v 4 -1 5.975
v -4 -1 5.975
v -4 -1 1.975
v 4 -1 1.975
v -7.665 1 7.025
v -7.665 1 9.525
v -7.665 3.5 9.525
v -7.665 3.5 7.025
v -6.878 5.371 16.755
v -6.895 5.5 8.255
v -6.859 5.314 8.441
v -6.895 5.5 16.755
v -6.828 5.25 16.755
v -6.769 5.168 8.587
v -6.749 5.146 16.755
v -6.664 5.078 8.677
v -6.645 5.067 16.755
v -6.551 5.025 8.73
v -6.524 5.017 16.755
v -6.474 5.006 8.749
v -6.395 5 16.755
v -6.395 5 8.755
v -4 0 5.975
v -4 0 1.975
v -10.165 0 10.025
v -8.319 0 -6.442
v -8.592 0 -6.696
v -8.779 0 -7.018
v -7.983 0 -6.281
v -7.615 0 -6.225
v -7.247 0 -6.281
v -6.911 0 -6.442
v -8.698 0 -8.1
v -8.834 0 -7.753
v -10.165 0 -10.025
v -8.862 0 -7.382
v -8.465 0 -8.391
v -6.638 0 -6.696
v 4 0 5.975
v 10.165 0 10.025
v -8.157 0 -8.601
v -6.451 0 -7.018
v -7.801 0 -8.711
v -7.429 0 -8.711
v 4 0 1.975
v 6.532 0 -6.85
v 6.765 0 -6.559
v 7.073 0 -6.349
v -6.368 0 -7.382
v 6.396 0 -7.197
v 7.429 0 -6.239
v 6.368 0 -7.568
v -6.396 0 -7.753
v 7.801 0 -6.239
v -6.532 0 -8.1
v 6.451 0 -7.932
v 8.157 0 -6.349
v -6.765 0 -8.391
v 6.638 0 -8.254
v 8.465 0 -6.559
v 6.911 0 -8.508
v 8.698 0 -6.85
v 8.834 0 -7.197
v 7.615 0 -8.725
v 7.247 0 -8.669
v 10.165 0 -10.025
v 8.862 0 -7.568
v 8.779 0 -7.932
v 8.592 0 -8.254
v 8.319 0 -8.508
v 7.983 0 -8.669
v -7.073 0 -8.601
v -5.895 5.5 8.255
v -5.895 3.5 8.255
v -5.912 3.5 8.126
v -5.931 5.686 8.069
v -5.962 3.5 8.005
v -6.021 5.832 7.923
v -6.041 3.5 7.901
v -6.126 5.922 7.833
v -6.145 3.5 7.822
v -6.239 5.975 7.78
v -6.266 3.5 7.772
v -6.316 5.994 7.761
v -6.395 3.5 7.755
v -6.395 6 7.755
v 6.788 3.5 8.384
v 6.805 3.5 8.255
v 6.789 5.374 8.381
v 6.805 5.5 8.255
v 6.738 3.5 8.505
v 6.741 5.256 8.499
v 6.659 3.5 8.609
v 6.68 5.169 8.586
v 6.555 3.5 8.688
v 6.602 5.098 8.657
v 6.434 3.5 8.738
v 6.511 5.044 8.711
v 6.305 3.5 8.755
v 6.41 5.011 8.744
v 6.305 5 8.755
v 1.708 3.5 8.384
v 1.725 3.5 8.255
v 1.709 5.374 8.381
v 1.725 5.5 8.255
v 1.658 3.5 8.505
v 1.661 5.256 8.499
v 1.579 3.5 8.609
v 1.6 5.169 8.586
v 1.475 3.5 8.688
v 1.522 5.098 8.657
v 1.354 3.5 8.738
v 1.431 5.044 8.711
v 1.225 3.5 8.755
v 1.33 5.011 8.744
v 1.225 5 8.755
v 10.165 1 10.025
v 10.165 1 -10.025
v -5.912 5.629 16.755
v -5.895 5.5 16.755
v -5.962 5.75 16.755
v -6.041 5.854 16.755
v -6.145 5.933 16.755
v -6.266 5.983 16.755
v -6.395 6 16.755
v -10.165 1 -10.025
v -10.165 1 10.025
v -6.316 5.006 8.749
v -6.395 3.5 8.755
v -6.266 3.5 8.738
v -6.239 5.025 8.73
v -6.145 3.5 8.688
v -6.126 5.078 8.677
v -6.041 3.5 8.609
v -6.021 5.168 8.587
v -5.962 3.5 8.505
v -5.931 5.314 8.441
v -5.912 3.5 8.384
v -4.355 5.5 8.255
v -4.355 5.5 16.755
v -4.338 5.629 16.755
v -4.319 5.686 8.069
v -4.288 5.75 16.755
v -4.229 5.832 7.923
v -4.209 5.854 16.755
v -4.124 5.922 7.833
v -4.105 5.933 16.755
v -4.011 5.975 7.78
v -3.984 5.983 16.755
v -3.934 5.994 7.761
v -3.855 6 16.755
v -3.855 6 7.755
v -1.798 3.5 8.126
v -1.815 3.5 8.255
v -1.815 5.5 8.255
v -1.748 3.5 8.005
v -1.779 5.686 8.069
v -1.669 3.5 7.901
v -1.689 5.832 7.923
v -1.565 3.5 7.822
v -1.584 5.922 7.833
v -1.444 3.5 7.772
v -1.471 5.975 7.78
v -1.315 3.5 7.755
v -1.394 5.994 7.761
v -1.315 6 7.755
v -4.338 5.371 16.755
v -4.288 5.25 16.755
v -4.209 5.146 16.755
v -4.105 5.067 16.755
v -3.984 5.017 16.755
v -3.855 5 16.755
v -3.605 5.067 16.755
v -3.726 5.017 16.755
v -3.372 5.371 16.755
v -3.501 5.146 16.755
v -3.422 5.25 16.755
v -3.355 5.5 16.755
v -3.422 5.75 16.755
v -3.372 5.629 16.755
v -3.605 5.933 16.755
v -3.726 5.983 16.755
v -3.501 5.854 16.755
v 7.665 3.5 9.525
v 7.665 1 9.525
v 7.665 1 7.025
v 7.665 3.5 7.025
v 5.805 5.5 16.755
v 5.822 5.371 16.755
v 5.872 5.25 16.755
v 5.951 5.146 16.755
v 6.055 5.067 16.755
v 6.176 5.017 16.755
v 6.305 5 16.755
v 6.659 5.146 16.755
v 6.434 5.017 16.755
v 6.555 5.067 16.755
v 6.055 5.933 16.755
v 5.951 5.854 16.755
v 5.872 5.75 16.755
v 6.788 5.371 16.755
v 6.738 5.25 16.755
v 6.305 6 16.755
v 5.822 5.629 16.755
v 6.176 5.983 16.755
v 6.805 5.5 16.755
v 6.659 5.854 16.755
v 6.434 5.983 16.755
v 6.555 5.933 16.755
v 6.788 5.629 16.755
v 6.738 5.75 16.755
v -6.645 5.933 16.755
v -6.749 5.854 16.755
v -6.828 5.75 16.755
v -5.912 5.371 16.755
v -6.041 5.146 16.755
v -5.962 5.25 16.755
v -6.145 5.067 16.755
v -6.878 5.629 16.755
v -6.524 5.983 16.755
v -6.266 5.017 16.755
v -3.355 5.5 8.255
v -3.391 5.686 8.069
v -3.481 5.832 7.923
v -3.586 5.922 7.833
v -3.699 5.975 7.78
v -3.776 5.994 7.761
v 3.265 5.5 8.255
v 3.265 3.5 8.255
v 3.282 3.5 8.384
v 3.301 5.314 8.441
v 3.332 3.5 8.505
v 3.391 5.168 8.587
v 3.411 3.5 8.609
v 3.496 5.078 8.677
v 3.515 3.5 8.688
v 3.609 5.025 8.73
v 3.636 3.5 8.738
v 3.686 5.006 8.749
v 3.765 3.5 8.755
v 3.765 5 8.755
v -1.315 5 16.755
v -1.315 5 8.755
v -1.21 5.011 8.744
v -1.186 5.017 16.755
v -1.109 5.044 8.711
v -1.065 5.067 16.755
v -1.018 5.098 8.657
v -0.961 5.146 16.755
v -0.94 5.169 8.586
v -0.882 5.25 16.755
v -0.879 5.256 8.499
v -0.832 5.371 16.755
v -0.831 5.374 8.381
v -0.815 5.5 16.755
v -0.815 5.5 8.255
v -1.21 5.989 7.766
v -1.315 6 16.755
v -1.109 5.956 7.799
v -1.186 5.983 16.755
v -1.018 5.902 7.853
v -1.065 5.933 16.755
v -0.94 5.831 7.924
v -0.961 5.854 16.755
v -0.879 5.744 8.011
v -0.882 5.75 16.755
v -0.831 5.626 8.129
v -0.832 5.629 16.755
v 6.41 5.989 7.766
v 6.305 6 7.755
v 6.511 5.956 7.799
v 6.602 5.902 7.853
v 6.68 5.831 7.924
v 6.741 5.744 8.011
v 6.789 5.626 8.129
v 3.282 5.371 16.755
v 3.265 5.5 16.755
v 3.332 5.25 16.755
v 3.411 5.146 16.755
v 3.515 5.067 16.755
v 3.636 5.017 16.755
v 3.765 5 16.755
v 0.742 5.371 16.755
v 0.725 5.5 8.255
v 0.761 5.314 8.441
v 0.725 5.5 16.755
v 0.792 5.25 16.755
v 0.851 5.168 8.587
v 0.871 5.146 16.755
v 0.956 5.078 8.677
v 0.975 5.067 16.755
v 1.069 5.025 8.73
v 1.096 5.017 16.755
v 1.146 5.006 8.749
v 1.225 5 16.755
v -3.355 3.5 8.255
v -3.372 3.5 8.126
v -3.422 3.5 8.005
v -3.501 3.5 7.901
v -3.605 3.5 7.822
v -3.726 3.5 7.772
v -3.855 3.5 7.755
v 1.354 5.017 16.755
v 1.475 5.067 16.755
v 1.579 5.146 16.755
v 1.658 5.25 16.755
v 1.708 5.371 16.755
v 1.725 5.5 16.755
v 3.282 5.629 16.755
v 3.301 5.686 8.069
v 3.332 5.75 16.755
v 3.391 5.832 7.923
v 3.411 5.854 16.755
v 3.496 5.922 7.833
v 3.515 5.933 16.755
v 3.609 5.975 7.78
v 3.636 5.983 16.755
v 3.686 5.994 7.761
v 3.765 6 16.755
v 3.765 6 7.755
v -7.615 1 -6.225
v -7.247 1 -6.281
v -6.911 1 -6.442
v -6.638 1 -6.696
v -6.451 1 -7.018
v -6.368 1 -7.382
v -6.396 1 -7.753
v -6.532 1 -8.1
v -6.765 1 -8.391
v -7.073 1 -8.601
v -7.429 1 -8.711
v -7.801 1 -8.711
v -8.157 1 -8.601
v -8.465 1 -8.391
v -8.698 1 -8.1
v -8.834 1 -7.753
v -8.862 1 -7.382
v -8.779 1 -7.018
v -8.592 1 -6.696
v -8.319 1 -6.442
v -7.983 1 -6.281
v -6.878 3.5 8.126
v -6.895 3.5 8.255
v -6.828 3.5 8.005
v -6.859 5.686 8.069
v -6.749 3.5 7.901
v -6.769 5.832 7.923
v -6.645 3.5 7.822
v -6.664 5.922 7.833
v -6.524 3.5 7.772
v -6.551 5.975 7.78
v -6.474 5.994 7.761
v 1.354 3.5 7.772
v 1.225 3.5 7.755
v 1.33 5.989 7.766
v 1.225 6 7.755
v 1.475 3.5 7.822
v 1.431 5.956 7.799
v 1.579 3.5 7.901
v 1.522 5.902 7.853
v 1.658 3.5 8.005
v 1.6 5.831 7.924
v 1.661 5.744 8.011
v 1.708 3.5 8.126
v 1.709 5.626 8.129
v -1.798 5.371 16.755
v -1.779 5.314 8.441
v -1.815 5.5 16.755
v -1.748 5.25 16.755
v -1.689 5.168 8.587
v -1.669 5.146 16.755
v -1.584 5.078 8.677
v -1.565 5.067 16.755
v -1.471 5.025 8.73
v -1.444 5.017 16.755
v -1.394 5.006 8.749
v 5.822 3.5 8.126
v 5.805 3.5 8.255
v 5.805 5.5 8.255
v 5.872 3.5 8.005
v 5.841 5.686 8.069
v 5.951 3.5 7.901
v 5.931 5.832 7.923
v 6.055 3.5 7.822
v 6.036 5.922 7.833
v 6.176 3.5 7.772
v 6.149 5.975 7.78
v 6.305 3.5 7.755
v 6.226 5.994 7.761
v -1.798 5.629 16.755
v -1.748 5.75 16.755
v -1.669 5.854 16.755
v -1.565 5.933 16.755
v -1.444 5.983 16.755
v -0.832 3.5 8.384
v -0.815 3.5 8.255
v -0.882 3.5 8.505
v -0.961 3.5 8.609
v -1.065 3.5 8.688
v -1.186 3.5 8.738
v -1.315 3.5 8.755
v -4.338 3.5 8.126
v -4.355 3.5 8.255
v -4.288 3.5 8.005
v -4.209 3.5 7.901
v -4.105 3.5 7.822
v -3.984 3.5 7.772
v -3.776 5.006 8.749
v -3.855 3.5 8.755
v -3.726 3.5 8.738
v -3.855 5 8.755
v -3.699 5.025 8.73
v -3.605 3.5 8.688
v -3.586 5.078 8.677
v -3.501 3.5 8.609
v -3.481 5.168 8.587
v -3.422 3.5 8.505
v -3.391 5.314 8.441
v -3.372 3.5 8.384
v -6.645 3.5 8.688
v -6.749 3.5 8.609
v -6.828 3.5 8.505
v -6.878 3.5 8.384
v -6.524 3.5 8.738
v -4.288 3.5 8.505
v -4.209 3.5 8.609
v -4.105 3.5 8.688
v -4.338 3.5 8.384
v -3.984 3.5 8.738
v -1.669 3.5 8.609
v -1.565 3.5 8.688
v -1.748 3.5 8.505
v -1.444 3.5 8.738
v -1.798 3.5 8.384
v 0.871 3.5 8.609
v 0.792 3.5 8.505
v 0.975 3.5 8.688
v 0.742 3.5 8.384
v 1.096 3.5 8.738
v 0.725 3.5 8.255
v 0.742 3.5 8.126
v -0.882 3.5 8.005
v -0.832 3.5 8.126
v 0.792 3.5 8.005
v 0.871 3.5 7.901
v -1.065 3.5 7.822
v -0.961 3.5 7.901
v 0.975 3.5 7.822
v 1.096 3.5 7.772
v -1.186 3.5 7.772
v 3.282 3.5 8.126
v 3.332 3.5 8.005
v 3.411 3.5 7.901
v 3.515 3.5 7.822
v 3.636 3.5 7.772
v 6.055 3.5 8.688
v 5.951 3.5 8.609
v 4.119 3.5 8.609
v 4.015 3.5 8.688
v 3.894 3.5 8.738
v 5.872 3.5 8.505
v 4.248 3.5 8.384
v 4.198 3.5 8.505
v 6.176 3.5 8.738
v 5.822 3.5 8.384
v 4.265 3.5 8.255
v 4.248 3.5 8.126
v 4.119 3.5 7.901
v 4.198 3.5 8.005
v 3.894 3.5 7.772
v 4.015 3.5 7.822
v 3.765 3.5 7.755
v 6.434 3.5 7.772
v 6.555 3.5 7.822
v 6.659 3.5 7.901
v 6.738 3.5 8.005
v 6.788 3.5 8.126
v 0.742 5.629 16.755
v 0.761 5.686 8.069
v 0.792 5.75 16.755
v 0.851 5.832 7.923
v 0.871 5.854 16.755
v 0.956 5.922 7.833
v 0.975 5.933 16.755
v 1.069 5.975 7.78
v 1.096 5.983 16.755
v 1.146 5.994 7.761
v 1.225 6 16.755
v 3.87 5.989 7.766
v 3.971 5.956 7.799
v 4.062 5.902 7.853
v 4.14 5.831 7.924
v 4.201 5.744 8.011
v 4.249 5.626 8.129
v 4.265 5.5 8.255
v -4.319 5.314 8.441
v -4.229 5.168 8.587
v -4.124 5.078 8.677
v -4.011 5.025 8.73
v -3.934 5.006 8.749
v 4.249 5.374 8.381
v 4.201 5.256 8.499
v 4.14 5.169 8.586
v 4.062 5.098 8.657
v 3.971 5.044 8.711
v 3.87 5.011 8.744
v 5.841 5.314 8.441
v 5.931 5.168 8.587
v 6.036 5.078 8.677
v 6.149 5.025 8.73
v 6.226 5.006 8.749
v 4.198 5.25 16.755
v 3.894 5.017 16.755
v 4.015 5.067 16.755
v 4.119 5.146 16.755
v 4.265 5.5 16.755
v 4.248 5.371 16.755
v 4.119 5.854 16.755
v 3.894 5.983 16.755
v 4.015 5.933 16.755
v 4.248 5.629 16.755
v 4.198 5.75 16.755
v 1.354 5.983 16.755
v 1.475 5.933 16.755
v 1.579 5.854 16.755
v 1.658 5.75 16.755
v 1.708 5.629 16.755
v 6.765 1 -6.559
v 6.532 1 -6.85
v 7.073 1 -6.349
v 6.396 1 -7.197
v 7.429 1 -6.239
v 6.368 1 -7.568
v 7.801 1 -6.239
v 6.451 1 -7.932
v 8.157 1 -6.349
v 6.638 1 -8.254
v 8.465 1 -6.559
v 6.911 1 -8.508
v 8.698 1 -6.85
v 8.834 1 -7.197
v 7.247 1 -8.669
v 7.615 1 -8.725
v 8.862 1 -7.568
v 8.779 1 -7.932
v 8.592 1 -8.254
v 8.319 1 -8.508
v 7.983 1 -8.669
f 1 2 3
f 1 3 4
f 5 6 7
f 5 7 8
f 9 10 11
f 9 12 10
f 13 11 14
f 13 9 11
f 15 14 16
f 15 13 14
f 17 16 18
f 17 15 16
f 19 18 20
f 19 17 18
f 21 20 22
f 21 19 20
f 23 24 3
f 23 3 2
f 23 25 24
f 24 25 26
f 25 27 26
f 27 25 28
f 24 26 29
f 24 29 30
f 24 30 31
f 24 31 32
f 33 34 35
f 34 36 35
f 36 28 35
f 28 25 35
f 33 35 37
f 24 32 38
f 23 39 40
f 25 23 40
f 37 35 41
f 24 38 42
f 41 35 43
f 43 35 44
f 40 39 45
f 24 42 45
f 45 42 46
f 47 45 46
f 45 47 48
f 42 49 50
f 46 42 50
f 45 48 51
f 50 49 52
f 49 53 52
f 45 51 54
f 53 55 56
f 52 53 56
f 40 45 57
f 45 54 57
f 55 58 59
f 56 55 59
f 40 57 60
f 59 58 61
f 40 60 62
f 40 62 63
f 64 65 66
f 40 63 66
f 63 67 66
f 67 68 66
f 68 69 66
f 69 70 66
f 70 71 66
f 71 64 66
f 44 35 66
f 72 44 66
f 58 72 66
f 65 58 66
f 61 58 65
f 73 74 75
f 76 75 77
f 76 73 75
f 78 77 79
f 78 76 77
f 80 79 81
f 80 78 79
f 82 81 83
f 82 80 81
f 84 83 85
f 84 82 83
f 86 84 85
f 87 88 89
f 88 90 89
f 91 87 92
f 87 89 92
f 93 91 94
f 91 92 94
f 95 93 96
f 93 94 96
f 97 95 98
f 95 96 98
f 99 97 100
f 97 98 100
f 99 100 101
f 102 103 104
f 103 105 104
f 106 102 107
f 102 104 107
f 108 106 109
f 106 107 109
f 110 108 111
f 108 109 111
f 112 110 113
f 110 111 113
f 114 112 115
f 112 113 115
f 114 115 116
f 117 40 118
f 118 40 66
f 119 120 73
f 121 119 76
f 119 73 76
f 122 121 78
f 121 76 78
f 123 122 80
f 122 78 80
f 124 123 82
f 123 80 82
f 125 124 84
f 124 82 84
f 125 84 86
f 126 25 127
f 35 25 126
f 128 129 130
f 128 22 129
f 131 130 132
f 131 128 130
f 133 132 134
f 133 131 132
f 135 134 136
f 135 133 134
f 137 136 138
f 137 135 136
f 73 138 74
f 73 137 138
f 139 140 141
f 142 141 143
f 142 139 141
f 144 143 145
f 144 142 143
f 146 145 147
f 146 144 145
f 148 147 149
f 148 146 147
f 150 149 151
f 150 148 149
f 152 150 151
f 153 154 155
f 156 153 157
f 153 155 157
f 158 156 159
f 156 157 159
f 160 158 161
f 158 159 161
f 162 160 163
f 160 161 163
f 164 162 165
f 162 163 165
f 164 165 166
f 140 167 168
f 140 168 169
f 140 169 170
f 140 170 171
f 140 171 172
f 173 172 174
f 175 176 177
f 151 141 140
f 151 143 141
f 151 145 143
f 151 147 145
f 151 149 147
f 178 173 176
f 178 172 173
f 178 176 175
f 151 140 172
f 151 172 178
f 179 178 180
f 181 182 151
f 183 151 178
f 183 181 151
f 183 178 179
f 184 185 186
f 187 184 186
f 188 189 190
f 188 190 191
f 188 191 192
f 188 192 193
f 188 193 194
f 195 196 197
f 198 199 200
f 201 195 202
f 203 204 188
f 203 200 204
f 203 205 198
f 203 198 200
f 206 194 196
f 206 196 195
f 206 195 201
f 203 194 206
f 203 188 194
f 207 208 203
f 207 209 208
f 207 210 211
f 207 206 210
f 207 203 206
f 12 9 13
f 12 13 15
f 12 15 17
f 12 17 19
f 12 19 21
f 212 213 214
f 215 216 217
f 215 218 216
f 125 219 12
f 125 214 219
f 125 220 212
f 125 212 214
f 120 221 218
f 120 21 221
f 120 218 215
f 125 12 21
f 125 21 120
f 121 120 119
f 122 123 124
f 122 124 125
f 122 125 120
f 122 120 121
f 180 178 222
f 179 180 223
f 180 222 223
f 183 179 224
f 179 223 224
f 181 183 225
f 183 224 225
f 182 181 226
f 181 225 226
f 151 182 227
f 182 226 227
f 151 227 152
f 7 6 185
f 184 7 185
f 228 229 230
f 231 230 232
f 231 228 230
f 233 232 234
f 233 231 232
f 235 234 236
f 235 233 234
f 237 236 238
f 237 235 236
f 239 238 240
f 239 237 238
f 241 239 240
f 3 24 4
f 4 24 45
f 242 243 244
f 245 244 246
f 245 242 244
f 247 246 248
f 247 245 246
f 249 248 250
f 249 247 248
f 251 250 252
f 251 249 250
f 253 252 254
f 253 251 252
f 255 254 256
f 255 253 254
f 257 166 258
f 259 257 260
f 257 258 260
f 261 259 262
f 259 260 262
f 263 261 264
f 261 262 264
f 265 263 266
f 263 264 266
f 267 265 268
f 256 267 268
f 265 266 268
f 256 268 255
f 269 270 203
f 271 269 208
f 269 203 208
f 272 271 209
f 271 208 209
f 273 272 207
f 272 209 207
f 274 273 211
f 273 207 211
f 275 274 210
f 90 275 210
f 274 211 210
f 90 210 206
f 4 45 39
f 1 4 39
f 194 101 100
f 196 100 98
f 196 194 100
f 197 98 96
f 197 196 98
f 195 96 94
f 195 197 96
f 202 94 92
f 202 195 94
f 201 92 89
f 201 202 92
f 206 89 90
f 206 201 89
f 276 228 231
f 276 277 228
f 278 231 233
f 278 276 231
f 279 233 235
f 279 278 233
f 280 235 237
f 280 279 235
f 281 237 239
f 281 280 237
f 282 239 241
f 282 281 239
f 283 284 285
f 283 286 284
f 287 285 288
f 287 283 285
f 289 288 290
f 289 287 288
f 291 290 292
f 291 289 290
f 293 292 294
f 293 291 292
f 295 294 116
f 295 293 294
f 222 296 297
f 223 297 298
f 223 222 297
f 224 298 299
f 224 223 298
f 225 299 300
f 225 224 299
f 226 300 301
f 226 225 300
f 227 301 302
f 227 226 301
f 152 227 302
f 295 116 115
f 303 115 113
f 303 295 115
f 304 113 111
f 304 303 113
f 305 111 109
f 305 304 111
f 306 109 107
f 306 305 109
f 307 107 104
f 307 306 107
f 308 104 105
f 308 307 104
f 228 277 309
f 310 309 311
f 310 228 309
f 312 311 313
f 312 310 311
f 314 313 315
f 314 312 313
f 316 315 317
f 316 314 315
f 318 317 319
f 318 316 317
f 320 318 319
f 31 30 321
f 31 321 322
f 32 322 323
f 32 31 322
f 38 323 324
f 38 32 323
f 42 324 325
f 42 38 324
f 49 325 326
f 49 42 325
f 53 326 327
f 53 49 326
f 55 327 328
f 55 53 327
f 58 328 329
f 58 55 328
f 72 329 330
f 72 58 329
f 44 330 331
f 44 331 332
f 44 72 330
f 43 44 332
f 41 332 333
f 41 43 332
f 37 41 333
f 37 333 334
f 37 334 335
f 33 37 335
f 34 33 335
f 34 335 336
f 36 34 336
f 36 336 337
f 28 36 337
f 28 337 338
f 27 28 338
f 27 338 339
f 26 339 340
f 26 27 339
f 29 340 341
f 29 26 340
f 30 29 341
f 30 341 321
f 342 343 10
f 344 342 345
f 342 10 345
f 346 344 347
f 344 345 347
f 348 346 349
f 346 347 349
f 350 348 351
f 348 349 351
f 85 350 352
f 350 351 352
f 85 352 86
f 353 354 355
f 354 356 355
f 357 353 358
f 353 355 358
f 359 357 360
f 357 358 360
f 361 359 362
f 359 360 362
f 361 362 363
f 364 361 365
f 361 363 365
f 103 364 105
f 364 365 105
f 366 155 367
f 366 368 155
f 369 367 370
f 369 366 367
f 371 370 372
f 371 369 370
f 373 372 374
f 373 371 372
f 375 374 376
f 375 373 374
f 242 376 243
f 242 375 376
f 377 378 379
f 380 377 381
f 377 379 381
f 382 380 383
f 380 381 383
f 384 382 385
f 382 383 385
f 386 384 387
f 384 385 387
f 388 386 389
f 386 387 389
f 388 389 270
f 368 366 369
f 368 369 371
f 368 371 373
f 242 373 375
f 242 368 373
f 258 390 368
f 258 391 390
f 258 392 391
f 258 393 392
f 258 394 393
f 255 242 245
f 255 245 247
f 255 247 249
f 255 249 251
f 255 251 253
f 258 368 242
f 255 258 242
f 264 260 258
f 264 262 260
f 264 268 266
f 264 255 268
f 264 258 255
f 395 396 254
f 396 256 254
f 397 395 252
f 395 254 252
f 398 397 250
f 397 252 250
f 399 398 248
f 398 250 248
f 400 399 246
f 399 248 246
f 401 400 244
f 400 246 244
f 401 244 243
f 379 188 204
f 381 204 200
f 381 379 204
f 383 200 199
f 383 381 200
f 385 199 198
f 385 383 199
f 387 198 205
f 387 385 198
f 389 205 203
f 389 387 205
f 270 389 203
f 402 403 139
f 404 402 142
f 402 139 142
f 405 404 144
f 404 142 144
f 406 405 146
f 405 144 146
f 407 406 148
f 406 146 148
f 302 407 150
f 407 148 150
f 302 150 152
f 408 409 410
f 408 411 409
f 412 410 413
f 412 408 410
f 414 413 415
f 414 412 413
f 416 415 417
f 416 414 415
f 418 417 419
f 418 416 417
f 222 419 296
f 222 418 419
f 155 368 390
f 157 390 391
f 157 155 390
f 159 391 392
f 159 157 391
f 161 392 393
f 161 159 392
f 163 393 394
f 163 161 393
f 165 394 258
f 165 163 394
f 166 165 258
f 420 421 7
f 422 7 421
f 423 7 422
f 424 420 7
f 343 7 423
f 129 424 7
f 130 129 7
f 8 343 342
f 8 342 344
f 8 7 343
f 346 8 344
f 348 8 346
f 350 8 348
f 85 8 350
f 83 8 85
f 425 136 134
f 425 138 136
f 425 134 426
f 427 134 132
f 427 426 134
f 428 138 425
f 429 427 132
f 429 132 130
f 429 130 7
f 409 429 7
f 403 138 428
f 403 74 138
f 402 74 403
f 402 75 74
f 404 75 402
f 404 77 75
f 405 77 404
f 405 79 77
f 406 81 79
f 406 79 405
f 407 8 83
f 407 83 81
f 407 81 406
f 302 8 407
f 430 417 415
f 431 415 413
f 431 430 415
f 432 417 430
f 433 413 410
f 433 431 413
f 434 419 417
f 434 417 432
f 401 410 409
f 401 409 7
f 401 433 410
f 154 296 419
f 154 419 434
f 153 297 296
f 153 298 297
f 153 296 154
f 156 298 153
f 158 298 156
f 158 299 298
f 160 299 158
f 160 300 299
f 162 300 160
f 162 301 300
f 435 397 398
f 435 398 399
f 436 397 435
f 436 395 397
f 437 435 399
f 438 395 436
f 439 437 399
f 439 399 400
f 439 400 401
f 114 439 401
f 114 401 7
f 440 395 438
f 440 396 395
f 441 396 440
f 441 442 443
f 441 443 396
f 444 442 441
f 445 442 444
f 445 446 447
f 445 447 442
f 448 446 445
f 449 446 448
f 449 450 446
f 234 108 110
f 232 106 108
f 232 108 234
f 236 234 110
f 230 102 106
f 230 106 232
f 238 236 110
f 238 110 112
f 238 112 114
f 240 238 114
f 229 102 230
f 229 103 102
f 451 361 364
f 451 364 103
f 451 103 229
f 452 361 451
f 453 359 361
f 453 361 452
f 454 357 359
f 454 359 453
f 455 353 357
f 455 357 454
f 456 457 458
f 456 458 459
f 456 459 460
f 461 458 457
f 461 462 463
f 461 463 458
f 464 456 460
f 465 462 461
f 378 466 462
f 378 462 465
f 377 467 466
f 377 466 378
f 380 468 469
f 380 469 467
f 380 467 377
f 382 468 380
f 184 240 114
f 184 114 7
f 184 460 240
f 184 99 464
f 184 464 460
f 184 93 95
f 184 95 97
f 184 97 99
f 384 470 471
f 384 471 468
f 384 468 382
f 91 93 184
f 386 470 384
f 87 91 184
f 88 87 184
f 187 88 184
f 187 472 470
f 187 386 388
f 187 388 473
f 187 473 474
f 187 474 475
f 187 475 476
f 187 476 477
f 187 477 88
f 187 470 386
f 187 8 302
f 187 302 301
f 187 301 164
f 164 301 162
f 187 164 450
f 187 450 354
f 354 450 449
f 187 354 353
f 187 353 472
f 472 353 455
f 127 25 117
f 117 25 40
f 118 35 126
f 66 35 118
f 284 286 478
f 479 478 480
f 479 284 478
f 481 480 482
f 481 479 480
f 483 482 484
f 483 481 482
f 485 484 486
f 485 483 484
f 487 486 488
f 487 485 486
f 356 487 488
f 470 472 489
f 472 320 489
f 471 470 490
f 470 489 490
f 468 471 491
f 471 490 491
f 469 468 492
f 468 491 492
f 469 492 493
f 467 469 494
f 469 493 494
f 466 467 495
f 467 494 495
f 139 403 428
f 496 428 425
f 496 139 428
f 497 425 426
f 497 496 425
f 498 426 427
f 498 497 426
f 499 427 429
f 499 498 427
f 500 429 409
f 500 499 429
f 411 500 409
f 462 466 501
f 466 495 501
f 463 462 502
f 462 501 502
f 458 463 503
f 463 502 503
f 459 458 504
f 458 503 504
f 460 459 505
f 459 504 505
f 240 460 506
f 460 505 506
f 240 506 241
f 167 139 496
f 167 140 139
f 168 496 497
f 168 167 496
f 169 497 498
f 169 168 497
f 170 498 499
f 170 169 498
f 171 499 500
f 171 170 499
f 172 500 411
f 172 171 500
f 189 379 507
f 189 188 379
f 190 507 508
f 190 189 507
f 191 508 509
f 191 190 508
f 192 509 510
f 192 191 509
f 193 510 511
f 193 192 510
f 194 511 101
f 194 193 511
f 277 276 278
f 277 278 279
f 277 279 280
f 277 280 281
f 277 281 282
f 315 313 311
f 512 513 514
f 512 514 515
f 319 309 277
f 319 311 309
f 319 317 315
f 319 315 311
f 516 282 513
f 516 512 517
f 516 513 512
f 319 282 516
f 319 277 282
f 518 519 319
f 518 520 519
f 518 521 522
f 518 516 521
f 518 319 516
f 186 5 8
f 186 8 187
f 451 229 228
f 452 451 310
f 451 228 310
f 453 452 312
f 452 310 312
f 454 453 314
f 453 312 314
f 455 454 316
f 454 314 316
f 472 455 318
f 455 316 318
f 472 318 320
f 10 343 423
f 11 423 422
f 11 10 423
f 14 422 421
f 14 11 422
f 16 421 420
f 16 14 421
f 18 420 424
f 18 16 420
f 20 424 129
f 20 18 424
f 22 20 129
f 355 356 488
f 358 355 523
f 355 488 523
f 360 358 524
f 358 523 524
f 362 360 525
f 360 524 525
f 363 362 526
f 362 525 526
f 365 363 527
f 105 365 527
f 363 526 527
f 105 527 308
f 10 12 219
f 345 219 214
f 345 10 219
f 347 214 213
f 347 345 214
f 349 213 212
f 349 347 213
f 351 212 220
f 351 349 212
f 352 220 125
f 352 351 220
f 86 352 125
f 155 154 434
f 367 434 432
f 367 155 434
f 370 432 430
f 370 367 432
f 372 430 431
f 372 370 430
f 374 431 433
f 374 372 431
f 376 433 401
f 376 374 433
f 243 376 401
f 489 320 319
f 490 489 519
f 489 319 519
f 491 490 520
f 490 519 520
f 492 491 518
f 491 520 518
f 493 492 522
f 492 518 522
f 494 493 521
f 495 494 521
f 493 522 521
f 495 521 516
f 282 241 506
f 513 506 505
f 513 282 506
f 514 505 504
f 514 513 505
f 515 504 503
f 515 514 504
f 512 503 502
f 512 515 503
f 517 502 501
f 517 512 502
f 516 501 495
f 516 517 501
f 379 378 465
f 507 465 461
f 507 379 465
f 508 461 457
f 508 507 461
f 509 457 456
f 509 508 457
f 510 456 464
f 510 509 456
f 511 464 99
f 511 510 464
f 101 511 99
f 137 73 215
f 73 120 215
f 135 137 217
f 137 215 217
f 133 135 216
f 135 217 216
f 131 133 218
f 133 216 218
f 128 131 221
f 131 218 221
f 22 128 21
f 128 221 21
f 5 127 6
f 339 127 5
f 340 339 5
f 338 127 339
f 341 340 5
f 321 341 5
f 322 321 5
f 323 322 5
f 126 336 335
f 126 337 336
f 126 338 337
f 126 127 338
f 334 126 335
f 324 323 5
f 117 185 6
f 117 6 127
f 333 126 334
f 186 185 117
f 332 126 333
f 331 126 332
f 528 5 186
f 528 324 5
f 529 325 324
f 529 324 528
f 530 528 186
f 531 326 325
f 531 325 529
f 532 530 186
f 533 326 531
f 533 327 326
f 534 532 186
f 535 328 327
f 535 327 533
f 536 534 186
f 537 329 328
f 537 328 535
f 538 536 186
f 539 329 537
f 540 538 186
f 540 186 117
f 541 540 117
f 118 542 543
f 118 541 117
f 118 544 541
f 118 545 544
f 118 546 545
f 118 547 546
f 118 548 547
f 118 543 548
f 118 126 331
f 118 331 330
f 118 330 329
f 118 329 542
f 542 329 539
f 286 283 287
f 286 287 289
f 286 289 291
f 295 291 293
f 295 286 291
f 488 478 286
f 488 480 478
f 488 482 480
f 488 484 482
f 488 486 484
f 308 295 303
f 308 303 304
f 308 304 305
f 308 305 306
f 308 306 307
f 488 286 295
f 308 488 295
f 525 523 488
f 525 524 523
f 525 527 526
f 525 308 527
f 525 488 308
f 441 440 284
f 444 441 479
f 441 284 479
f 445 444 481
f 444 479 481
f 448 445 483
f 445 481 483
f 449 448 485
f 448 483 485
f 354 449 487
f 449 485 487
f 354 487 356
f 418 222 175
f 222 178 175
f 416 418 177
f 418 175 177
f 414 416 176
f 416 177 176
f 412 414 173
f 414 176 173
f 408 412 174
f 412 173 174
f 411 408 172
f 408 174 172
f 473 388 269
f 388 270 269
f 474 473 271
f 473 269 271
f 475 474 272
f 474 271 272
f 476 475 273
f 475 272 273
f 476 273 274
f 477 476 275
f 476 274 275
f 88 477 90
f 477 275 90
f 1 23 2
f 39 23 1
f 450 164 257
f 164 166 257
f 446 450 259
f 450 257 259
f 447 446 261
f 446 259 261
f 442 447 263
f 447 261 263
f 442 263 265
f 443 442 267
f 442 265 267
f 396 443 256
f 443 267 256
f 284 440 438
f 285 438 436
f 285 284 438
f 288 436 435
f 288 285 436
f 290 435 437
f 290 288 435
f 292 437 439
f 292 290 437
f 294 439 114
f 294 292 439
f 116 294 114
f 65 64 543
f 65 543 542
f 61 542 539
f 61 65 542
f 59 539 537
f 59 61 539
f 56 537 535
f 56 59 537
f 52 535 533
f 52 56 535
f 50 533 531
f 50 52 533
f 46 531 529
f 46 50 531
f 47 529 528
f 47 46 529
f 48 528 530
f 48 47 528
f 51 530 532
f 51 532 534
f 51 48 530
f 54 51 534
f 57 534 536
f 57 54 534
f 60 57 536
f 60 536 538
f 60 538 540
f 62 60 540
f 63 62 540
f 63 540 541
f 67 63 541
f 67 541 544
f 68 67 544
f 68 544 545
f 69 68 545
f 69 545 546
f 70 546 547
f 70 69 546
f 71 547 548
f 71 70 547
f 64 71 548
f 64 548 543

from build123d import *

# Parameters (mm, degrees)
SKETCH1_W              = 20.33
SKETCH1_H              = 20.05
SKETCH1_R              = 1.25
BOSS_EXTRUDE1_DEPTH    = 1
SKETCH2_W              = 8
SKETCH2_H              = 4
BOSS_EXTRUDE2_DEPTH    = 1
SKETCH3_W              = 15.33
SKETCH3_H              = 2.5
BOSS_EXTRUDE3_DEPTH    = 2.5
SKETCH4_W              = 1
SKETCH4_H              = 1
BOSS_EXTRUDE4_DEPTH    = 2.5
SKETCH5_W              = 1
SKETCH5_H              = 1
BOSS_EXTRUDE5_DEPTH    = 8
FILLET1_R              = 0.5
LPATTERN4_COUNT        = 6
LPATTERN4_PITCH        = 2.54
FILLET1_OF_LPATTERN4_R = 0.5


with BuildPart() as part:
    # Sketch1 → Boss-Extrude1 (new body)
    with BuildSketch(Plane(origin=(0, 0, 0), x_dir=(1, 0, 0), z_dir=(0, 1, 0))):
        Rectangle(SKETCH1_W, SKETCH1_H)
        with Locations(Location((-7.615, 7.475, 0), (0, 0, 270))):
            Circle(SKETCH1_R, mode=Mode.SUBTRACT)
        with Locations(Location((7.615, 7.475, 0), (0, 0, 90))):
            Circle(SKETCH1_R, mode=Mode.SUBTRACT)
    extrude(amount=BOSS_EXTRUDE1_DEPTH)

    # Sketch2 → Boss-Extrude2 (add)
    with BuildSketch(Plane.XZ):
        with Locations((0, 3.975)):
            Rectangle(SKETCH2_W, SKETCH2_H)
    extrude(amount=BOSS_EXTRUDE2_DEPTH)

    # Sketch3 → Boss-Extrude3 (add)
    with BuildSketch(Plane(origin=(0, 1, 0), x_dir=(1, 0, 0), z_dir=(0, 1, 0))):
        with Locations((0, -8.275)):
            Rectangle(SKETCH3_W, SKETCH3_H)
    extrude(amount=BOSS_EXTRUDE3_DEPTH)

    # Sketch4 → Boss-Extrude4 (add)
    with BuildSketch(Plane(origin=(0, 3.5, 0), x_dir=(1, 0, 0), z_dir=(0, 1, 0))):
        with Locations((-6.395, -8.255)):
            Rectangle(SKETCH4_W, SKETCH4_H)
    boss_extrude4 = extrude(amount=BOSS_EXTRUDE4_DEPTH)

    # Sketch5 → Boss-Extrude5 (add)
    with BuildSketch(Plane.XY.offset(8.755)):
        with Locations((-6.395, 5.5)):
            Rectangle(SKETCH5_W, SKETCH5_H)
    boss_extrude5 = extrude(amount=BOSS_EXTRUDE5_DEPTH)

    # Fillet1
    fillet1_edges = [part.edges().sort_by_distance(p)[0] for p in [
        (-5.895, 5, 12.755),
        (-6.895, 5, 12.755),
        (-5.895, 4.25, 8.755),
        (-6.895, 4.25, 8.755),
        (-5.895, 4.75, 7.755),
        (-6.895, 4.75, 7.755),
        (-5.895, 6, 12.255),
        (-6.895, 6, 12.255),
    ]]
    fillet(fillet1_edges, radius=FILLET1_R - 0.0001)  # a hair under: the kernel refuses the full size

    # LPattern4: Boss-Extrude4, Boss-Extrude5 ×6
    with Locations(*[(i * LPATTERN4_PITCH, 0, 0) for i in range(1, LPATTERN4_COUNT)]):
        add(boss_extrude4)
        add(boss_extrude5)

    # Fillet1 of LPattern4
    fillet1_of_lpattern4_edges = [part.edges().sort_by_distance(p)[0] for p in [
        (-3.355, 5, 12.755),
        (-4.355, 5, 12.755),
        (-3.355, 4.25, 8.755),
        (-4.355, 4.25, 8.755),
        (-3.355, 4.75, 7.755),
        (-4.355, 4.75, 7.755),
        (-3.355, 6, 12.255),
        (-4.355, 6, 12.255),
        (-0.815, 5, 12.755),
        (-1.815, 5, 12.755),
        (-0.815, 4.25, 8.755),
        (-1.815, 4.25, 8.755),
        (-0.815, 4.75, 7.755),
        (-1.815, 4.75, 7.755),
        (-0.815, 6, 12.255),
        (-1.815, 6, 12.255),
        (1.725, 5, 12.755),
        (0.725, 5, 12.755),
        (1.725, 4.25, 8.755),
        (0.725, 4.25, 8.755),
        (1.725, 4.75, 7.755),
        (0.725, 4.75, 7.755),
        (1.725, 6, 12.255),
        (0.725, 6, 12.255),
        (4.265, 5, 12.755),
        (3.265, 5, 12.755),
        (4.265, 4.25, 8.755),
        (3.265, 4.25, 8.755),
        (4.265, 4.75, 7.755),
        (3.265, 4.75, 7.755),
        (4.265, 6, 12.255),
        (3.265, 6, 12.255),
        (6.805, 5, 12.755),
        (5.805, 5, 12.755),
        (6.805, 4.25, 8.755),
        (5.805, 4.25, 8.755),
        (6.805, 4.75, 7.755),
        (5.805, 4.75, 7.755),
        (6.805, 6, 12.255),
        (5.805, 6, 12.255),
    ]]
    fillet(fillet1_of_lpattern4_edges, radius=FILLET1_OF_LPATTERN4_R - 0.0001)  # a hair under: the kernel refuses the full size


solid = part.part
